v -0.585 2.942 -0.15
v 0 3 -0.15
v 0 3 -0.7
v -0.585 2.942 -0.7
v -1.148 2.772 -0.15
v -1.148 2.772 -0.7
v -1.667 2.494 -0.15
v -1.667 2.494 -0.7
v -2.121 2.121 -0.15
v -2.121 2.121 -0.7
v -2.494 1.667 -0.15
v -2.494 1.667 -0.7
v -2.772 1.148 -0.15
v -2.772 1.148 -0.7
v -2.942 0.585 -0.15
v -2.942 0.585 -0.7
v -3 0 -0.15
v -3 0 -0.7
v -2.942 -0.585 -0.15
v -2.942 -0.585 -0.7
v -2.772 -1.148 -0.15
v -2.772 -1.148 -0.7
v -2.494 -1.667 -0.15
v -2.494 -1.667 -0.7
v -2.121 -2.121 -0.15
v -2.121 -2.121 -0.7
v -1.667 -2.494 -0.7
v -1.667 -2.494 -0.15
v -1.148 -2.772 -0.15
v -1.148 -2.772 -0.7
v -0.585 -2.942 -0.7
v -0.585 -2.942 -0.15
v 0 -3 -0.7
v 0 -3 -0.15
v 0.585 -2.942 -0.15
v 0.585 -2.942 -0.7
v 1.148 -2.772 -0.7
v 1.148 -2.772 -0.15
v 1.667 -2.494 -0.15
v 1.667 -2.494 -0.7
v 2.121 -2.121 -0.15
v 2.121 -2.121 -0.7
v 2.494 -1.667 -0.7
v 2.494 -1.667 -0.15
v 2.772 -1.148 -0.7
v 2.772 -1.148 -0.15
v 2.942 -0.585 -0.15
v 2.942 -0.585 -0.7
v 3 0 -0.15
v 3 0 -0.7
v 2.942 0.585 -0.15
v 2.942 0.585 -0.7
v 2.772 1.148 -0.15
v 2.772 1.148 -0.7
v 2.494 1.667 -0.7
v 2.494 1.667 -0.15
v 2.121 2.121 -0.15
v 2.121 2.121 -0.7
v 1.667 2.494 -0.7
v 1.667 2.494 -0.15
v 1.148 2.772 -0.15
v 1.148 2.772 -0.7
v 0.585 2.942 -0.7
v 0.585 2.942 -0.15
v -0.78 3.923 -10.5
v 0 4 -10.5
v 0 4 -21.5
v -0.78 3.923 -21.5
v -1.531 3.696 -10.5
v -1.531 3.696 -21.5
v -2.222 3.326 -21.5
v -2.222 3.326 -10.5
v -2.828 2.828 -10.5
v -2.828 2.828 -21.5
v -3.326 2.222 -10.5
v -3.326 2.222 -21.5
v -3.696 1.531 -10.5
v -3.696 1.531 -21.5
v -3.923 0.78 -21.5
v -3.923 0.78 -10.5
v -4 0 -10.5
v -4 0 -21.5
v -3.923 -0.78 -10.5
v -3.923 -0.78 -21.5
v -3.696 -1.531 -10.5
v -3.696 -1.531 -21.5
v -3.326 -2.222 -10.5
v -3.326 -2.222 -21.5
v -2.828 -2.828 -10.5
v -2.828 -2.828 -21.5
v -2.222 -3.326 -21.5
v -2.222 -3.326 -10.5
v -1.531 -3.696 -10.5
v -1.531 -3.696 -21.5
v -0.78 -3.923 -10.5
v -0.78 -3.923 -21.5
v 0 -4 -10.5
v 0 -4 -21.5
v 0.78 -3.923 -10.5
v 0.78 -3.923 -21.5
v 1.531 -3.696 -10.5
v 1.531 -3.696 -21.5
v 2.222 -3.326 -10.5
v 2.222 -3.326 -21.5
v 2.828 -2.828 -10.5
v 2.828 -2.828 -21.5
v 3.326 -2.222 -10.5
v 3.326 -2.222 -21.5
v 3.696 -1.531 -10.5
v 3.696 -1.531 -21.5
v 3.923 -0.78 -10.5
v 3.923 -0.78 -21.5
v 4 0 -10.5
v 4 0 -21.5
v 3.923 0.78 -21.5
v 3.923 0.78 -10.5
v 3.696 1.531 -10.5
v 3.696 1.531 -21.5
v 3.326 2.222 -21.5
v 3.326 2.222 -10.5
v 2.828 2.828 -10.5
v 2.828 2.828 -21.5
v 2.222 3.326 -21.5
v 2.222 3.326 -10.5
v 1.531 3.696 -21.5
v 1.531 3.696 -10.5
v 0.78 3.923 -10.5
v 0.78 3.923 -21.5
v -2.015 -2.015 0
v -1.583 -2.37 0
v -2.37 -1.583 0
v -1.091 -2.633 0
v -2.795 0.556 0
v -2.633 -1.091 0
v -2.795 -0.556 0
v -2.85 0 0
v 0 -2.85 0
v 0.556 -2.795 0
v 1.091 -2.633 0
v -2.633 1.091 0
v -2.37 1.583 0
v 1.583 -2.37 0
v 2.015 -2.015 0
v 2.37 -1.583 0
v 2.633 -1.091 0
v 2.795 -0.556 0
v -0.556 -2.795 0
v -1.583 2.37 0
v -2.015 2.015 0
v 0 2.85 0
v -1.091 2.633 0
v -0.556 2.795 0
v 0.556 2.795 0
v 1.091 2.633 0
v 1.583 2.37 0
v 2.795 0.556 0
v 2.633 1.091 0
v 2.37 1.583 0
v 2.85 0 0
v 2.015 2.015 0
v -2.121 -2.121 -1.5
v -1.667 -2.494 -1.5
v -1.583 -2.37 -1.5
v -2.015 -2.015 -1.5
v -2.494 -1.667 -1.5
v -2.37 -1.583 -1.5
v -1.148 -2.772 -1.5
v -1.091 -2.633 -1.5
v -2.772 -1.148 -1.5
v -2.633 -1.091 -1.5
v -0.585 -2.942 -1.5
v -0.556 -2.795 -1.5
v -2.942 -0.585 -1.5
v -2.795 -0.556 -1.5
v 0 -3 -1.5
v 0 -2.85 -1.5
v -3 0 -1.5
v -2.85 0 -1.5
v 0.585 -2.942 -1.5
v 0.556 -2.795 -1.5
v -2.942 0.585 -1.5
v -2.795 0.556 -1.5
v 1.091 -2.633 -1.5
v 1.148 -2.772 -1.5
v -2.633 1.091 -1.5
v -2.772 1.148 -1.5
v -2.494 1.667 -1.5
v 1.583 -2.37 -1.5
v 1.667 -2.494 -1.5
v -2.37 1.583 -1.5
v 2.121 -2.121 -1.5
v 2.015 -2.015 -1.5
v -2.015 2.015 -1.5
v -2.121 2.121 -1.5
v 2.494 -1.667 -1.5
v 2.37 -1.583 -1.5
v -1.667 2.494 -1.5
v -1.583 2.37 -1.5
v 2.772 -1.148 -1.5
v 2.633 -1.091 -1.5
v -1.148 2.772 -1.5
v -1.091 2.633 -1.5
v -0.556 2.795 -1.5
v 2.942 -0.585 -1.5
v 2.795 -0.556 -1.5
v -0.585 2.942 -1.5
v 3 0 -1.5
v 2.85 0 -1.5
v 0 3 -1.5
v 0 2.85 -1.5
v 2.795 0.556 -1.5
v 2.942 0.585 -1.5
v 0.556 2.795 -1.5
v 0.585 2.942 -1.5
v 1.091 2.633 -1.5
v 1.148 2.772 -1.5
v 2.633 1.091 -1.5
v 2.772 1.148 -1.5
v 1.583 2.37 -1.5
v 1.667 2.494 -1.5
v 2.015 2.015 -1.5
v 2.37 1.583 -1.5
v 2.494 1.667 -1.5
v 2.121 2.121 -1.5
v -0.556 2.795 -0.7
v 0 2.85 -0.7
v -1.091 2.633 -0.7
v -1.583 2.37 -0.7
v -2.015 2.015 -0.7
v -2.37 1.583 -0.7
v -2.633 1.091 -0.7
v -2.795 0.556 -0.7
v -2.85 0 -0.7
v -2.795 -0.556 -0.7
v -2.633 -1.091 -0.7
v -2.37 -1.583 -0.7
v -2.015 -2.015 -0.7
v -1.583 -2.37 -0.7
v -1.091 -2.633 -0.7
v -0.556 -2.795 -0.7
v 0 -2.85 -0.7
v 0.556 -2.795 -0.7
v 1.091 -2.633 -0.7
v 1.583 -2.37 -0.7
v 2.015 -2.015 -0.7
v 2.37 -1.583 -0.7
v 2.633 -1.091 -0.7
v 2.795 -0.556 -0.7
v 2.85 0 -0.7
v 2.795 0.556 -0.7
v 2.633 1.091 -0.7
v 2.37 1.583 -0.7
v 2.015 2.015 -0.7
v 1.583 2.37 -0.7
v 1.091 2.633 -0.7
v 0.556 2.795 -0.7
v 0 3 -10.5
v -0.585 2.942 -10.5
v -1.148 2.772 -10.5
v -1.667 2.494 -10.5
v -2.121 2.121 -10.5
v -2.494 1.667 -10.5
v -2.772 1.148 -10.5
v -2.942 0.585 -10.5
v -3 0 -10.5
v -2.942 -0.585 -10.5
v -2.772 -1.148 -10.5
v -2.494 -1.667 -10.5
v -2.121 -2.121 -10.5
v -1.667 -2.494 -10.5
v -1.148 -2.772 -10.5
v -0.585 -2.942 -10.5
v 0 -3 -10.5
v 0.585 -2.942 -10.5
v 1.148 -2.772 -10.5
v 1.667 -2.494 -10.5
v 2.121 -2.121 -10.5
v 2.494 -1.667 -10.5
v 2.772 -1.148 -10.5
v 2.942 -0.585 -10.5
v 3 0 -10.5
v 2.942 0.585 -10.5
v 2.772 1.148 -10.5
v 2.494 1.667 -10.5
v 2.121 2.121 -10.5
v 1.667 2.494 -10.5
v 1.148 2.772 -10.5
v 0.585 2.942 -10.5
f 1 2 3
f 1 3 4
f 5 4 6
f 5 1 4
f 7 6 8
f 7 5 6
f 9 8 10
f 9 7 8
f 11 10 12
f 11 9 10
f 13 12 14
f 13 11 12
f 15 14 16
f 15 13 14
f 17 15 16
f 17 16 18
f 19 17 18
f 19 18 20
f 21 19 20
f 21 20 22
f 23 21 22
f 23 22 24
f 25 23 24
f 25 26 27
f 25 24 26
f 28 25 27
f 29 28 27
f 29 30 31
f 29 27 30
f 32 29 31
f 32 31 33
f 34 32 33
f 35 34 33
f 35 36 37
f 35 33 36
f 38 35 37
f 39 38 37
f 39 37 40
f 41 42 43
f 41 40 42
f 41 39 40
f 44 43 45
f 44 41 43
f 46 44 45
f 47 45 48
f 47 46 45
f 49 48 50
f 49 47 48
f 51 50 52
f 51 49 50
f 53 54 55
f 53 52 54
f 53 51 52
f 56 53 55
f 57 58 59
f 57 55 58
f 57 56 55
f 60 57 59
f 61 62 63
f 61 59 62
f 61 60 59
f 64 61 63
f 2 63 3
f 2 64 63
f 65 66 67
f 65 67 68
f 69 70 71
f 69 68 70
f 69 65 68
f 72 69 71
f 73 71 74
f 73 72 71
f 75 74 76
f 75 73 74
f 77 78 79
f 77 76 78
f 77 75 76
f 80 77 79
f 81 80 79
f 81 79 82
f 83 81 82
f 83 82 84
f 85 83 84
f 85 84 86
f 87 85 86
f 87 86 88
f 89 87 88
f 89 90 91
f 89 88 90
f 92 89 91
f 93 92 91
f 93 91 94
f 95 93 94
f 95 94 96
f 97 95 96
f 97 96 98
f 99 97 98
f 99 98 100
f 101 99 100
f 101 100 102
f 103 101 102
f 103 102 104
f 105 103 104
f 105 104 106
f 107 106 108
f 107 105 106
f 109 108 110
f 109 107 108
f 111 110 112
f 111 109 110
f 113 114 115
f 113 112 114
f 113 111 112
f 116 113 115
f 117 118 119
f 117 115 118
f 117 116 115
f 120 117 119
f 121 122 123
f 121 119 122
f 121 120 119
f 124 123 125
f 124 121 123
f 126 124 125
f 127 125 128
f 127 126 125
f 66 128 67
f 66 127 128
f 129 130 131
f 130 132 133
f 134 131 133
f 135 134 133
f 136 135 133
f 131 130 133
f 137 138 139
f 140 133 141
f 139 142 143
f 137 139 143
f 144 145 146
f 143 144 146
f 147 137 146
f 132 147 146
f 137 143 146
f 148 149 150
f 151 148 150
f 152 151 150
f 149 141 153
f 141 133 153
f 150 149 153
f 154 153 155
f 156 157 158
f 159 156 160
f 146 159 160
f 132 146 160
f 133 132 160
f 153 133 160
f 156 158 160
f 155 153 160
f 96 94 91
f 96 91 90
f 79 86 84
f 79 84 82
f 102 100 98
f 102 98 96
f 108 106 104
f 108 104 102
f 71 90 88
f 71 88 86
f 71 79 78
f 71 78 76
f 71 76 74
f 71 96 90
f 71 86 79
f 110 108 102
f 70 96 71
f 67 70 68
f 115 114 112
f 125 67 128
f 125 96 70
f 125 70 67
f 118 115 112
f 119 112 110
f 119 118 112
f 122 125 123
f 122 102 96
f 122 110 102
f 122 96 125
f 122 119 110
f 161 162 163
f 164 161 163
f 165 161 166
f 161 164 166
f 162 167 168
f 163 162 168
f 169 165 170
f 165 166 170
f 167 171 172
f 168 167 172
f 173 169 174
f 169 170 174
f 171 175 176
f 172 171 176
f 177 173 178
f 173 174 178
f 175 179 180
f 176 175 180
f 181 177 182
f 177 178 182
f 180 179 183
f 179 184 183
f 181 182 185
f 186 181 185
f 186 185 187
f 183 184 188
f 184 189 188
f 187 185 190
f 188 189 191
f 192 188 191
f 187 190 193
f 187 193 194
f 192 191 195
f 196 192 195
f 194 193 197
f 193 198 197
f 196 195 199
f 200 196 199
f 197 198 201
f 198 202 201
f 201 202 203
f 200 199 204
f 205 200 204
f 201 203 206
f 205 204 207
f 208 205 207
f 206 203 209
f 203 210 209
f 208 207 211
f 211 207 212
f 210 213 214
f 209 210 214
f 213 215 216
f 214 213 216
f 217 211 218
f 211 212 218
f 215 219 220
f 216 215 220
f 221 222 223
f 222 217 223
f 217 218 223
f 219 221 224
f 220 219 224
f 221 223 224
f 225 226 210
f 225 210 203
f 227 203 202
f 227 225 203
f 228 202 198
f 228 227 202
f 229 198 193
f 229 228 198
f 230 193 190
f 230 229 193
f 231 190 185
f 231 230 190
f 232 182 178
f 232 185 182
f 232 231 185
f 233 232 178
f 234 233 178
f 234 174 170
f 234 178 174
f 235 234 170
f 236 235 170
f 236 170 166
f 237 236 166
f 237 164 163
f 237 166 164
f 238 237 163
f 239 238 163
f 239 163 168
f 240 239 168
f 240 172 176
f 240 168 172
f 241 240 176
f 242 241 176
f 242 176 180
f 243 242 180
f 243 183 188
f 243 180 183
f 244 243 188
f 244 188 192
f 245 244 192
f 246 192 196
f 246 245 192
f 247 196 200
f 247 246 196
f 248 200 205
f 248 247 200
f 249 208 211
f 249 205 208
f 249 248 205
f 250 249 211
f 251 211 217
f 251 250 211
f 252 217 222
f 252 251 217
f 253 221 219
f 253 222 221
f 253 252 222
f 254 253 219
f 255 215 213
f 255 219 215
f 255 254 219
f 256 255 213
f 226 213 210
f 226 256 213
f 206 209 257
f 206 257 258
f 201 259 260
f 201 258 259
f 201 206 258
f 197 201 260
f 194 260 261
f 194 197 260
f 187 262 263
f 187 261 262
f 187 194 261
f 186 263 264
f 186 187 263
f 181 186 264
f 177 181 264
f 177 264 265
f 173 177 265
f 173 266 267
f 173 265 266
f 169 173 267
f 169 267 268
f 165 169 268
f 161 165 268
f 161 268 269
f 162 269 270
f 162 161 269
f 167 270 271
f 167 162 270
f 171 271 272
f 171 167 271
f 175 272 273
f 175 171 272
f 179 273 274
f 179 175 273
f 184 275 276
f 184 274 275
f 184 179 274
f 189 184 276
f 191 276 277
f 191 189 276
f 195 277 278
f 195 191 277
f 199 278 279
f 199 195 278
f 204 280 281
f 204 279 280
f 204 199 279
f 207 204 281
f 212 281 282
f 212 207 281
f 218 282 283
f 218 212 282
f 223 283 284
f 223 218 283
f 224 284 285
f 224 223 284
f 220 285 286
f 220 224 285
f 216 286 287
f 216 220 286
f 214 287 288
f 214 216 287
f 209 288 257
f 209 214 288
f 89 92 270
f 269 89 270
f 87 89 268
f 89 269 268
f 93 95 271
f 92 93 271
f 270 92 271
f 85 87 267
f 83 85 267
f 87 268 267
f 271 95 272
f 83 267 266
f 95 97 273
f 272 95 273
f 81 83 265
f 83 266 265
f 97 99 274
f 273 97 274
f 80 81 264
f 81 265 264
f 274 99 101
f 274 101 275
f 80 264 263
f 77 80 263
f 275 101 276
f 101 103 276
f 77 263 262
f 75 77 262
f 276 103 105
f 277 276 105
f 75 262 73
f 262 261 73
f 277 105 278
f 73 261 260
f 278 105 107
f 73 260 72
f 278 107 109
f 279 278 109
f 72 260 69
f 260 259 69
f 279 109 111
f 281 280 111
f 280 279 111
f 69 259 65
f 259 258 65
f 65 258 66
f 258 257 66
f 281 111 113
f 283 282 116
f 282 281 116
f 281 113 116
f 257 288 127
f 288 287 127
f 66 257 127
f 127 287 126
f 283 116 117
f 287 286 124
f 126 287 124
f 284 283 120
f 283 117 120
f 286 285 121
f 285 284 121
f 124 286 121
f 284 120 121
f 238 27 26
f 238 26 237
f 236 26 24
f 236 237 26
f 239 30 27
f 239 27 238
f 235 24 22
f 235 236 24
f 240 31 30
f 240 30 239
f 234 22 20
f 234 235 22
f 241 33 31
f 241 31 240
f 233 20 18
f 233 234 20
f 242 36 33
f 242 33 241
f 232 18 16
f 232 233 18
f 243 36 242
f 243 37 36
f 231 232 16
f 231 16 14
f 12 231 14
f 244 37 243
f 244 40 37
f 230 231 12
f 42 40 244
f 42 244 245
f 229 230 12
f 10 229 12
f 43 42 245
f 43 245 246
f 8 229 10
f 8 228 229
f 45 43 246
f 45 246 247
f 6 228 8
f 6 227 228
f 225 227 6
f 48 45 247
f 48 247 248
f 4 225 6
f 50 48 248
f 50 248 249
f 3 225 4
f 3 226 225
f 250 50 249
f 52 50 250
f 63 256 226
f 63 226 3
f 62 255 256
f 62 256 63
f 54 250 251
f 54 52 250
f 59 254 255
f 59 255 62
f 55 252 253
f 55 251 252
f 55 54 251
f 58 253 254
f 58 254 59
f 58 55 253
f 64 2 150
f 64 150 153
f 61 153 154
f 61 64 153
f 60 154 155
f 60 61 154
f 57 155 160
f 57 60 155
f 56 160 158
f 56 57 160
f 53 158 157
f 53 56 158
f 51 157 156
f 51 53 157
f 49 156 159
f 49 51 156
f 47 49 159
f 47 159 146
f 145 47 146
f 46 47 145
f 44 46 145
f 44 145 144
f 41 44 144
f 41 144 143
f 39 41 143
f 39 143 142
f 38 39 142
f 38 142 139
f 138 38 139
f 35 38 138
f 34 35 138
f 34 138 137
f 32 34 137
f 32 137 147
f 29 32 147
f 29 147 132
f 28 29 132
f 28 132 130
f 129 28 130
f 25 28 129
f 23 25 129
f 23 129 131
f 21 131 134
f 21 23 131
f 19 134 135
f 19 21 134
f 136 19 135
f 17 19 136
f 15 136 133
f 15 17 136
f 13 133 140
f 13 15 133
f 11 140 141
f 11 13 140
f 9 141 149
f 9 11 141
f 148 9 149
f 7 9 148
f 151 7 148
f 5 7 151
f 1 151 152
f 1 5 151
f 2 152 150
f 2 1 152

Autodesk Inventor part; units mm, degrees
ref_plane "YZ Plane" through (0, 0, 0) normal (1, 0, 0) x (0, 1, 0)
ref_plane "XZ Plane" through (0, 0, 0) normal (0, 1, 0) x (-1, 0, 0)
ref_plane "XY Plane" through (0, 0, 0) normal (0, 0, 1) x (1, 0, 0)
sketch "Sketch1" plane through (0, 0, 0) normal (1, 0, 0) x (0, 1, 0)
  line L0 (0, 0) -> (0, -21.5)
  line L1 (0, -21.5) -> (4, -21.5)
  line L2 (4, -21.5) -> (4, -10.5)
  line L3 (4, -10.5) -> (3, -10.5)
  line L4 (3, -10.5) -> (3, -1.5)
  line L5 (3, -1.5) -> (2.85, -1.5)
  line L6 (2.85, -1.5) -> (2.85, -0.7)
  line L7 (2.85, -0.7) -> (3, -0.7)
  line L8 (3, -0.7) -> (3, -0.15)
  line L9 (3, -0.15) -> (2.85, 0)
  line L10 (2.85, 0) -> (0, 0)
  dimension "d0" = 21.5
  dimension "d1" = 0.15
  dimension "d2" = 0.15
  dimension "d3" = 0.7
  dimension "d4" = 0.15
  dimension "d5" = 0.8
  dimension "d6" = 11
  dimension "d7" = 9
  dimension "d8" = 4
  dimension "d9" = 3
revolve "Revolution1" add sketch "Sketch1" angle 360 about axis through (0, 0, 0) along (0, 0, -1)
properties part number "Component 3 (Planet Gear Axis)"
